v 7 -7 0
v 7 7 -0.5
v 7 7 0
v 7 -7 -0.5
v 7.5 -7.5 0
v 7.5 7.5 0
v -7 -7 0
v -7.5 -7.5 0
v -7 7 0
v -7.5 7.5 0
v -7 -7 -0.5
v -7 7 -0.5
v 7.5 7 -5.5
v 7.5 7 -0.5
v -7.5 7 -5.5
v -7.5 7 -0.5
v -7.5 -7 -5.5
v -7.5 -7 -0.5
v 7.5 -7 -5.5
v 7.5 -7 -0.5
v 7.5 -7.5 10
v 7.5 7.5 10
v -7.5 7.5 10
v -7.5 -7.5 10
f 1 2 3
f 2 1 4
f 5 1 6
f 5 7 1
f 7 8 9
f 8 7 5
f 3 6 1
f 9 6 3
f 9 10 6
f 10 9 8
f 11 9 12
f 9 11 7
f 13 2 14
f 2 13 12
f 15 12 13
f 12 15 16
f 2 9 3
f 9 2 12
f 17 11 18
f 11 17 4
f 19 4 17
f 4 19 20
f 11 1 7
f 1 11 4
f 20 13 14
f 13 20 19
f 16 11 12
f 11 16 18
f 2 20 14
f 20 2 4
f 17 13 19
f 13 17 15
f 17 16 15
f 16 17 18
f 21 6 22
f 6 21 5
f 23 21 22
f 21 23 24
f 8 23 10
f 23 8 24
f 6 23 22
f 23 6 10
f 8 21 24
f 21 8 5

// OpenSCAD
union () {
  translate ([0, 0, -0.5]) {
    cube ([14, 14, 1], center=true);
  }
  translate ([0, 0, -3]) {
    cube ([15, 14, 5], center=true);
  }
  translate ([0, 0, 5]) {
    cube ([15, 15, 10], center=true);
  }
}
